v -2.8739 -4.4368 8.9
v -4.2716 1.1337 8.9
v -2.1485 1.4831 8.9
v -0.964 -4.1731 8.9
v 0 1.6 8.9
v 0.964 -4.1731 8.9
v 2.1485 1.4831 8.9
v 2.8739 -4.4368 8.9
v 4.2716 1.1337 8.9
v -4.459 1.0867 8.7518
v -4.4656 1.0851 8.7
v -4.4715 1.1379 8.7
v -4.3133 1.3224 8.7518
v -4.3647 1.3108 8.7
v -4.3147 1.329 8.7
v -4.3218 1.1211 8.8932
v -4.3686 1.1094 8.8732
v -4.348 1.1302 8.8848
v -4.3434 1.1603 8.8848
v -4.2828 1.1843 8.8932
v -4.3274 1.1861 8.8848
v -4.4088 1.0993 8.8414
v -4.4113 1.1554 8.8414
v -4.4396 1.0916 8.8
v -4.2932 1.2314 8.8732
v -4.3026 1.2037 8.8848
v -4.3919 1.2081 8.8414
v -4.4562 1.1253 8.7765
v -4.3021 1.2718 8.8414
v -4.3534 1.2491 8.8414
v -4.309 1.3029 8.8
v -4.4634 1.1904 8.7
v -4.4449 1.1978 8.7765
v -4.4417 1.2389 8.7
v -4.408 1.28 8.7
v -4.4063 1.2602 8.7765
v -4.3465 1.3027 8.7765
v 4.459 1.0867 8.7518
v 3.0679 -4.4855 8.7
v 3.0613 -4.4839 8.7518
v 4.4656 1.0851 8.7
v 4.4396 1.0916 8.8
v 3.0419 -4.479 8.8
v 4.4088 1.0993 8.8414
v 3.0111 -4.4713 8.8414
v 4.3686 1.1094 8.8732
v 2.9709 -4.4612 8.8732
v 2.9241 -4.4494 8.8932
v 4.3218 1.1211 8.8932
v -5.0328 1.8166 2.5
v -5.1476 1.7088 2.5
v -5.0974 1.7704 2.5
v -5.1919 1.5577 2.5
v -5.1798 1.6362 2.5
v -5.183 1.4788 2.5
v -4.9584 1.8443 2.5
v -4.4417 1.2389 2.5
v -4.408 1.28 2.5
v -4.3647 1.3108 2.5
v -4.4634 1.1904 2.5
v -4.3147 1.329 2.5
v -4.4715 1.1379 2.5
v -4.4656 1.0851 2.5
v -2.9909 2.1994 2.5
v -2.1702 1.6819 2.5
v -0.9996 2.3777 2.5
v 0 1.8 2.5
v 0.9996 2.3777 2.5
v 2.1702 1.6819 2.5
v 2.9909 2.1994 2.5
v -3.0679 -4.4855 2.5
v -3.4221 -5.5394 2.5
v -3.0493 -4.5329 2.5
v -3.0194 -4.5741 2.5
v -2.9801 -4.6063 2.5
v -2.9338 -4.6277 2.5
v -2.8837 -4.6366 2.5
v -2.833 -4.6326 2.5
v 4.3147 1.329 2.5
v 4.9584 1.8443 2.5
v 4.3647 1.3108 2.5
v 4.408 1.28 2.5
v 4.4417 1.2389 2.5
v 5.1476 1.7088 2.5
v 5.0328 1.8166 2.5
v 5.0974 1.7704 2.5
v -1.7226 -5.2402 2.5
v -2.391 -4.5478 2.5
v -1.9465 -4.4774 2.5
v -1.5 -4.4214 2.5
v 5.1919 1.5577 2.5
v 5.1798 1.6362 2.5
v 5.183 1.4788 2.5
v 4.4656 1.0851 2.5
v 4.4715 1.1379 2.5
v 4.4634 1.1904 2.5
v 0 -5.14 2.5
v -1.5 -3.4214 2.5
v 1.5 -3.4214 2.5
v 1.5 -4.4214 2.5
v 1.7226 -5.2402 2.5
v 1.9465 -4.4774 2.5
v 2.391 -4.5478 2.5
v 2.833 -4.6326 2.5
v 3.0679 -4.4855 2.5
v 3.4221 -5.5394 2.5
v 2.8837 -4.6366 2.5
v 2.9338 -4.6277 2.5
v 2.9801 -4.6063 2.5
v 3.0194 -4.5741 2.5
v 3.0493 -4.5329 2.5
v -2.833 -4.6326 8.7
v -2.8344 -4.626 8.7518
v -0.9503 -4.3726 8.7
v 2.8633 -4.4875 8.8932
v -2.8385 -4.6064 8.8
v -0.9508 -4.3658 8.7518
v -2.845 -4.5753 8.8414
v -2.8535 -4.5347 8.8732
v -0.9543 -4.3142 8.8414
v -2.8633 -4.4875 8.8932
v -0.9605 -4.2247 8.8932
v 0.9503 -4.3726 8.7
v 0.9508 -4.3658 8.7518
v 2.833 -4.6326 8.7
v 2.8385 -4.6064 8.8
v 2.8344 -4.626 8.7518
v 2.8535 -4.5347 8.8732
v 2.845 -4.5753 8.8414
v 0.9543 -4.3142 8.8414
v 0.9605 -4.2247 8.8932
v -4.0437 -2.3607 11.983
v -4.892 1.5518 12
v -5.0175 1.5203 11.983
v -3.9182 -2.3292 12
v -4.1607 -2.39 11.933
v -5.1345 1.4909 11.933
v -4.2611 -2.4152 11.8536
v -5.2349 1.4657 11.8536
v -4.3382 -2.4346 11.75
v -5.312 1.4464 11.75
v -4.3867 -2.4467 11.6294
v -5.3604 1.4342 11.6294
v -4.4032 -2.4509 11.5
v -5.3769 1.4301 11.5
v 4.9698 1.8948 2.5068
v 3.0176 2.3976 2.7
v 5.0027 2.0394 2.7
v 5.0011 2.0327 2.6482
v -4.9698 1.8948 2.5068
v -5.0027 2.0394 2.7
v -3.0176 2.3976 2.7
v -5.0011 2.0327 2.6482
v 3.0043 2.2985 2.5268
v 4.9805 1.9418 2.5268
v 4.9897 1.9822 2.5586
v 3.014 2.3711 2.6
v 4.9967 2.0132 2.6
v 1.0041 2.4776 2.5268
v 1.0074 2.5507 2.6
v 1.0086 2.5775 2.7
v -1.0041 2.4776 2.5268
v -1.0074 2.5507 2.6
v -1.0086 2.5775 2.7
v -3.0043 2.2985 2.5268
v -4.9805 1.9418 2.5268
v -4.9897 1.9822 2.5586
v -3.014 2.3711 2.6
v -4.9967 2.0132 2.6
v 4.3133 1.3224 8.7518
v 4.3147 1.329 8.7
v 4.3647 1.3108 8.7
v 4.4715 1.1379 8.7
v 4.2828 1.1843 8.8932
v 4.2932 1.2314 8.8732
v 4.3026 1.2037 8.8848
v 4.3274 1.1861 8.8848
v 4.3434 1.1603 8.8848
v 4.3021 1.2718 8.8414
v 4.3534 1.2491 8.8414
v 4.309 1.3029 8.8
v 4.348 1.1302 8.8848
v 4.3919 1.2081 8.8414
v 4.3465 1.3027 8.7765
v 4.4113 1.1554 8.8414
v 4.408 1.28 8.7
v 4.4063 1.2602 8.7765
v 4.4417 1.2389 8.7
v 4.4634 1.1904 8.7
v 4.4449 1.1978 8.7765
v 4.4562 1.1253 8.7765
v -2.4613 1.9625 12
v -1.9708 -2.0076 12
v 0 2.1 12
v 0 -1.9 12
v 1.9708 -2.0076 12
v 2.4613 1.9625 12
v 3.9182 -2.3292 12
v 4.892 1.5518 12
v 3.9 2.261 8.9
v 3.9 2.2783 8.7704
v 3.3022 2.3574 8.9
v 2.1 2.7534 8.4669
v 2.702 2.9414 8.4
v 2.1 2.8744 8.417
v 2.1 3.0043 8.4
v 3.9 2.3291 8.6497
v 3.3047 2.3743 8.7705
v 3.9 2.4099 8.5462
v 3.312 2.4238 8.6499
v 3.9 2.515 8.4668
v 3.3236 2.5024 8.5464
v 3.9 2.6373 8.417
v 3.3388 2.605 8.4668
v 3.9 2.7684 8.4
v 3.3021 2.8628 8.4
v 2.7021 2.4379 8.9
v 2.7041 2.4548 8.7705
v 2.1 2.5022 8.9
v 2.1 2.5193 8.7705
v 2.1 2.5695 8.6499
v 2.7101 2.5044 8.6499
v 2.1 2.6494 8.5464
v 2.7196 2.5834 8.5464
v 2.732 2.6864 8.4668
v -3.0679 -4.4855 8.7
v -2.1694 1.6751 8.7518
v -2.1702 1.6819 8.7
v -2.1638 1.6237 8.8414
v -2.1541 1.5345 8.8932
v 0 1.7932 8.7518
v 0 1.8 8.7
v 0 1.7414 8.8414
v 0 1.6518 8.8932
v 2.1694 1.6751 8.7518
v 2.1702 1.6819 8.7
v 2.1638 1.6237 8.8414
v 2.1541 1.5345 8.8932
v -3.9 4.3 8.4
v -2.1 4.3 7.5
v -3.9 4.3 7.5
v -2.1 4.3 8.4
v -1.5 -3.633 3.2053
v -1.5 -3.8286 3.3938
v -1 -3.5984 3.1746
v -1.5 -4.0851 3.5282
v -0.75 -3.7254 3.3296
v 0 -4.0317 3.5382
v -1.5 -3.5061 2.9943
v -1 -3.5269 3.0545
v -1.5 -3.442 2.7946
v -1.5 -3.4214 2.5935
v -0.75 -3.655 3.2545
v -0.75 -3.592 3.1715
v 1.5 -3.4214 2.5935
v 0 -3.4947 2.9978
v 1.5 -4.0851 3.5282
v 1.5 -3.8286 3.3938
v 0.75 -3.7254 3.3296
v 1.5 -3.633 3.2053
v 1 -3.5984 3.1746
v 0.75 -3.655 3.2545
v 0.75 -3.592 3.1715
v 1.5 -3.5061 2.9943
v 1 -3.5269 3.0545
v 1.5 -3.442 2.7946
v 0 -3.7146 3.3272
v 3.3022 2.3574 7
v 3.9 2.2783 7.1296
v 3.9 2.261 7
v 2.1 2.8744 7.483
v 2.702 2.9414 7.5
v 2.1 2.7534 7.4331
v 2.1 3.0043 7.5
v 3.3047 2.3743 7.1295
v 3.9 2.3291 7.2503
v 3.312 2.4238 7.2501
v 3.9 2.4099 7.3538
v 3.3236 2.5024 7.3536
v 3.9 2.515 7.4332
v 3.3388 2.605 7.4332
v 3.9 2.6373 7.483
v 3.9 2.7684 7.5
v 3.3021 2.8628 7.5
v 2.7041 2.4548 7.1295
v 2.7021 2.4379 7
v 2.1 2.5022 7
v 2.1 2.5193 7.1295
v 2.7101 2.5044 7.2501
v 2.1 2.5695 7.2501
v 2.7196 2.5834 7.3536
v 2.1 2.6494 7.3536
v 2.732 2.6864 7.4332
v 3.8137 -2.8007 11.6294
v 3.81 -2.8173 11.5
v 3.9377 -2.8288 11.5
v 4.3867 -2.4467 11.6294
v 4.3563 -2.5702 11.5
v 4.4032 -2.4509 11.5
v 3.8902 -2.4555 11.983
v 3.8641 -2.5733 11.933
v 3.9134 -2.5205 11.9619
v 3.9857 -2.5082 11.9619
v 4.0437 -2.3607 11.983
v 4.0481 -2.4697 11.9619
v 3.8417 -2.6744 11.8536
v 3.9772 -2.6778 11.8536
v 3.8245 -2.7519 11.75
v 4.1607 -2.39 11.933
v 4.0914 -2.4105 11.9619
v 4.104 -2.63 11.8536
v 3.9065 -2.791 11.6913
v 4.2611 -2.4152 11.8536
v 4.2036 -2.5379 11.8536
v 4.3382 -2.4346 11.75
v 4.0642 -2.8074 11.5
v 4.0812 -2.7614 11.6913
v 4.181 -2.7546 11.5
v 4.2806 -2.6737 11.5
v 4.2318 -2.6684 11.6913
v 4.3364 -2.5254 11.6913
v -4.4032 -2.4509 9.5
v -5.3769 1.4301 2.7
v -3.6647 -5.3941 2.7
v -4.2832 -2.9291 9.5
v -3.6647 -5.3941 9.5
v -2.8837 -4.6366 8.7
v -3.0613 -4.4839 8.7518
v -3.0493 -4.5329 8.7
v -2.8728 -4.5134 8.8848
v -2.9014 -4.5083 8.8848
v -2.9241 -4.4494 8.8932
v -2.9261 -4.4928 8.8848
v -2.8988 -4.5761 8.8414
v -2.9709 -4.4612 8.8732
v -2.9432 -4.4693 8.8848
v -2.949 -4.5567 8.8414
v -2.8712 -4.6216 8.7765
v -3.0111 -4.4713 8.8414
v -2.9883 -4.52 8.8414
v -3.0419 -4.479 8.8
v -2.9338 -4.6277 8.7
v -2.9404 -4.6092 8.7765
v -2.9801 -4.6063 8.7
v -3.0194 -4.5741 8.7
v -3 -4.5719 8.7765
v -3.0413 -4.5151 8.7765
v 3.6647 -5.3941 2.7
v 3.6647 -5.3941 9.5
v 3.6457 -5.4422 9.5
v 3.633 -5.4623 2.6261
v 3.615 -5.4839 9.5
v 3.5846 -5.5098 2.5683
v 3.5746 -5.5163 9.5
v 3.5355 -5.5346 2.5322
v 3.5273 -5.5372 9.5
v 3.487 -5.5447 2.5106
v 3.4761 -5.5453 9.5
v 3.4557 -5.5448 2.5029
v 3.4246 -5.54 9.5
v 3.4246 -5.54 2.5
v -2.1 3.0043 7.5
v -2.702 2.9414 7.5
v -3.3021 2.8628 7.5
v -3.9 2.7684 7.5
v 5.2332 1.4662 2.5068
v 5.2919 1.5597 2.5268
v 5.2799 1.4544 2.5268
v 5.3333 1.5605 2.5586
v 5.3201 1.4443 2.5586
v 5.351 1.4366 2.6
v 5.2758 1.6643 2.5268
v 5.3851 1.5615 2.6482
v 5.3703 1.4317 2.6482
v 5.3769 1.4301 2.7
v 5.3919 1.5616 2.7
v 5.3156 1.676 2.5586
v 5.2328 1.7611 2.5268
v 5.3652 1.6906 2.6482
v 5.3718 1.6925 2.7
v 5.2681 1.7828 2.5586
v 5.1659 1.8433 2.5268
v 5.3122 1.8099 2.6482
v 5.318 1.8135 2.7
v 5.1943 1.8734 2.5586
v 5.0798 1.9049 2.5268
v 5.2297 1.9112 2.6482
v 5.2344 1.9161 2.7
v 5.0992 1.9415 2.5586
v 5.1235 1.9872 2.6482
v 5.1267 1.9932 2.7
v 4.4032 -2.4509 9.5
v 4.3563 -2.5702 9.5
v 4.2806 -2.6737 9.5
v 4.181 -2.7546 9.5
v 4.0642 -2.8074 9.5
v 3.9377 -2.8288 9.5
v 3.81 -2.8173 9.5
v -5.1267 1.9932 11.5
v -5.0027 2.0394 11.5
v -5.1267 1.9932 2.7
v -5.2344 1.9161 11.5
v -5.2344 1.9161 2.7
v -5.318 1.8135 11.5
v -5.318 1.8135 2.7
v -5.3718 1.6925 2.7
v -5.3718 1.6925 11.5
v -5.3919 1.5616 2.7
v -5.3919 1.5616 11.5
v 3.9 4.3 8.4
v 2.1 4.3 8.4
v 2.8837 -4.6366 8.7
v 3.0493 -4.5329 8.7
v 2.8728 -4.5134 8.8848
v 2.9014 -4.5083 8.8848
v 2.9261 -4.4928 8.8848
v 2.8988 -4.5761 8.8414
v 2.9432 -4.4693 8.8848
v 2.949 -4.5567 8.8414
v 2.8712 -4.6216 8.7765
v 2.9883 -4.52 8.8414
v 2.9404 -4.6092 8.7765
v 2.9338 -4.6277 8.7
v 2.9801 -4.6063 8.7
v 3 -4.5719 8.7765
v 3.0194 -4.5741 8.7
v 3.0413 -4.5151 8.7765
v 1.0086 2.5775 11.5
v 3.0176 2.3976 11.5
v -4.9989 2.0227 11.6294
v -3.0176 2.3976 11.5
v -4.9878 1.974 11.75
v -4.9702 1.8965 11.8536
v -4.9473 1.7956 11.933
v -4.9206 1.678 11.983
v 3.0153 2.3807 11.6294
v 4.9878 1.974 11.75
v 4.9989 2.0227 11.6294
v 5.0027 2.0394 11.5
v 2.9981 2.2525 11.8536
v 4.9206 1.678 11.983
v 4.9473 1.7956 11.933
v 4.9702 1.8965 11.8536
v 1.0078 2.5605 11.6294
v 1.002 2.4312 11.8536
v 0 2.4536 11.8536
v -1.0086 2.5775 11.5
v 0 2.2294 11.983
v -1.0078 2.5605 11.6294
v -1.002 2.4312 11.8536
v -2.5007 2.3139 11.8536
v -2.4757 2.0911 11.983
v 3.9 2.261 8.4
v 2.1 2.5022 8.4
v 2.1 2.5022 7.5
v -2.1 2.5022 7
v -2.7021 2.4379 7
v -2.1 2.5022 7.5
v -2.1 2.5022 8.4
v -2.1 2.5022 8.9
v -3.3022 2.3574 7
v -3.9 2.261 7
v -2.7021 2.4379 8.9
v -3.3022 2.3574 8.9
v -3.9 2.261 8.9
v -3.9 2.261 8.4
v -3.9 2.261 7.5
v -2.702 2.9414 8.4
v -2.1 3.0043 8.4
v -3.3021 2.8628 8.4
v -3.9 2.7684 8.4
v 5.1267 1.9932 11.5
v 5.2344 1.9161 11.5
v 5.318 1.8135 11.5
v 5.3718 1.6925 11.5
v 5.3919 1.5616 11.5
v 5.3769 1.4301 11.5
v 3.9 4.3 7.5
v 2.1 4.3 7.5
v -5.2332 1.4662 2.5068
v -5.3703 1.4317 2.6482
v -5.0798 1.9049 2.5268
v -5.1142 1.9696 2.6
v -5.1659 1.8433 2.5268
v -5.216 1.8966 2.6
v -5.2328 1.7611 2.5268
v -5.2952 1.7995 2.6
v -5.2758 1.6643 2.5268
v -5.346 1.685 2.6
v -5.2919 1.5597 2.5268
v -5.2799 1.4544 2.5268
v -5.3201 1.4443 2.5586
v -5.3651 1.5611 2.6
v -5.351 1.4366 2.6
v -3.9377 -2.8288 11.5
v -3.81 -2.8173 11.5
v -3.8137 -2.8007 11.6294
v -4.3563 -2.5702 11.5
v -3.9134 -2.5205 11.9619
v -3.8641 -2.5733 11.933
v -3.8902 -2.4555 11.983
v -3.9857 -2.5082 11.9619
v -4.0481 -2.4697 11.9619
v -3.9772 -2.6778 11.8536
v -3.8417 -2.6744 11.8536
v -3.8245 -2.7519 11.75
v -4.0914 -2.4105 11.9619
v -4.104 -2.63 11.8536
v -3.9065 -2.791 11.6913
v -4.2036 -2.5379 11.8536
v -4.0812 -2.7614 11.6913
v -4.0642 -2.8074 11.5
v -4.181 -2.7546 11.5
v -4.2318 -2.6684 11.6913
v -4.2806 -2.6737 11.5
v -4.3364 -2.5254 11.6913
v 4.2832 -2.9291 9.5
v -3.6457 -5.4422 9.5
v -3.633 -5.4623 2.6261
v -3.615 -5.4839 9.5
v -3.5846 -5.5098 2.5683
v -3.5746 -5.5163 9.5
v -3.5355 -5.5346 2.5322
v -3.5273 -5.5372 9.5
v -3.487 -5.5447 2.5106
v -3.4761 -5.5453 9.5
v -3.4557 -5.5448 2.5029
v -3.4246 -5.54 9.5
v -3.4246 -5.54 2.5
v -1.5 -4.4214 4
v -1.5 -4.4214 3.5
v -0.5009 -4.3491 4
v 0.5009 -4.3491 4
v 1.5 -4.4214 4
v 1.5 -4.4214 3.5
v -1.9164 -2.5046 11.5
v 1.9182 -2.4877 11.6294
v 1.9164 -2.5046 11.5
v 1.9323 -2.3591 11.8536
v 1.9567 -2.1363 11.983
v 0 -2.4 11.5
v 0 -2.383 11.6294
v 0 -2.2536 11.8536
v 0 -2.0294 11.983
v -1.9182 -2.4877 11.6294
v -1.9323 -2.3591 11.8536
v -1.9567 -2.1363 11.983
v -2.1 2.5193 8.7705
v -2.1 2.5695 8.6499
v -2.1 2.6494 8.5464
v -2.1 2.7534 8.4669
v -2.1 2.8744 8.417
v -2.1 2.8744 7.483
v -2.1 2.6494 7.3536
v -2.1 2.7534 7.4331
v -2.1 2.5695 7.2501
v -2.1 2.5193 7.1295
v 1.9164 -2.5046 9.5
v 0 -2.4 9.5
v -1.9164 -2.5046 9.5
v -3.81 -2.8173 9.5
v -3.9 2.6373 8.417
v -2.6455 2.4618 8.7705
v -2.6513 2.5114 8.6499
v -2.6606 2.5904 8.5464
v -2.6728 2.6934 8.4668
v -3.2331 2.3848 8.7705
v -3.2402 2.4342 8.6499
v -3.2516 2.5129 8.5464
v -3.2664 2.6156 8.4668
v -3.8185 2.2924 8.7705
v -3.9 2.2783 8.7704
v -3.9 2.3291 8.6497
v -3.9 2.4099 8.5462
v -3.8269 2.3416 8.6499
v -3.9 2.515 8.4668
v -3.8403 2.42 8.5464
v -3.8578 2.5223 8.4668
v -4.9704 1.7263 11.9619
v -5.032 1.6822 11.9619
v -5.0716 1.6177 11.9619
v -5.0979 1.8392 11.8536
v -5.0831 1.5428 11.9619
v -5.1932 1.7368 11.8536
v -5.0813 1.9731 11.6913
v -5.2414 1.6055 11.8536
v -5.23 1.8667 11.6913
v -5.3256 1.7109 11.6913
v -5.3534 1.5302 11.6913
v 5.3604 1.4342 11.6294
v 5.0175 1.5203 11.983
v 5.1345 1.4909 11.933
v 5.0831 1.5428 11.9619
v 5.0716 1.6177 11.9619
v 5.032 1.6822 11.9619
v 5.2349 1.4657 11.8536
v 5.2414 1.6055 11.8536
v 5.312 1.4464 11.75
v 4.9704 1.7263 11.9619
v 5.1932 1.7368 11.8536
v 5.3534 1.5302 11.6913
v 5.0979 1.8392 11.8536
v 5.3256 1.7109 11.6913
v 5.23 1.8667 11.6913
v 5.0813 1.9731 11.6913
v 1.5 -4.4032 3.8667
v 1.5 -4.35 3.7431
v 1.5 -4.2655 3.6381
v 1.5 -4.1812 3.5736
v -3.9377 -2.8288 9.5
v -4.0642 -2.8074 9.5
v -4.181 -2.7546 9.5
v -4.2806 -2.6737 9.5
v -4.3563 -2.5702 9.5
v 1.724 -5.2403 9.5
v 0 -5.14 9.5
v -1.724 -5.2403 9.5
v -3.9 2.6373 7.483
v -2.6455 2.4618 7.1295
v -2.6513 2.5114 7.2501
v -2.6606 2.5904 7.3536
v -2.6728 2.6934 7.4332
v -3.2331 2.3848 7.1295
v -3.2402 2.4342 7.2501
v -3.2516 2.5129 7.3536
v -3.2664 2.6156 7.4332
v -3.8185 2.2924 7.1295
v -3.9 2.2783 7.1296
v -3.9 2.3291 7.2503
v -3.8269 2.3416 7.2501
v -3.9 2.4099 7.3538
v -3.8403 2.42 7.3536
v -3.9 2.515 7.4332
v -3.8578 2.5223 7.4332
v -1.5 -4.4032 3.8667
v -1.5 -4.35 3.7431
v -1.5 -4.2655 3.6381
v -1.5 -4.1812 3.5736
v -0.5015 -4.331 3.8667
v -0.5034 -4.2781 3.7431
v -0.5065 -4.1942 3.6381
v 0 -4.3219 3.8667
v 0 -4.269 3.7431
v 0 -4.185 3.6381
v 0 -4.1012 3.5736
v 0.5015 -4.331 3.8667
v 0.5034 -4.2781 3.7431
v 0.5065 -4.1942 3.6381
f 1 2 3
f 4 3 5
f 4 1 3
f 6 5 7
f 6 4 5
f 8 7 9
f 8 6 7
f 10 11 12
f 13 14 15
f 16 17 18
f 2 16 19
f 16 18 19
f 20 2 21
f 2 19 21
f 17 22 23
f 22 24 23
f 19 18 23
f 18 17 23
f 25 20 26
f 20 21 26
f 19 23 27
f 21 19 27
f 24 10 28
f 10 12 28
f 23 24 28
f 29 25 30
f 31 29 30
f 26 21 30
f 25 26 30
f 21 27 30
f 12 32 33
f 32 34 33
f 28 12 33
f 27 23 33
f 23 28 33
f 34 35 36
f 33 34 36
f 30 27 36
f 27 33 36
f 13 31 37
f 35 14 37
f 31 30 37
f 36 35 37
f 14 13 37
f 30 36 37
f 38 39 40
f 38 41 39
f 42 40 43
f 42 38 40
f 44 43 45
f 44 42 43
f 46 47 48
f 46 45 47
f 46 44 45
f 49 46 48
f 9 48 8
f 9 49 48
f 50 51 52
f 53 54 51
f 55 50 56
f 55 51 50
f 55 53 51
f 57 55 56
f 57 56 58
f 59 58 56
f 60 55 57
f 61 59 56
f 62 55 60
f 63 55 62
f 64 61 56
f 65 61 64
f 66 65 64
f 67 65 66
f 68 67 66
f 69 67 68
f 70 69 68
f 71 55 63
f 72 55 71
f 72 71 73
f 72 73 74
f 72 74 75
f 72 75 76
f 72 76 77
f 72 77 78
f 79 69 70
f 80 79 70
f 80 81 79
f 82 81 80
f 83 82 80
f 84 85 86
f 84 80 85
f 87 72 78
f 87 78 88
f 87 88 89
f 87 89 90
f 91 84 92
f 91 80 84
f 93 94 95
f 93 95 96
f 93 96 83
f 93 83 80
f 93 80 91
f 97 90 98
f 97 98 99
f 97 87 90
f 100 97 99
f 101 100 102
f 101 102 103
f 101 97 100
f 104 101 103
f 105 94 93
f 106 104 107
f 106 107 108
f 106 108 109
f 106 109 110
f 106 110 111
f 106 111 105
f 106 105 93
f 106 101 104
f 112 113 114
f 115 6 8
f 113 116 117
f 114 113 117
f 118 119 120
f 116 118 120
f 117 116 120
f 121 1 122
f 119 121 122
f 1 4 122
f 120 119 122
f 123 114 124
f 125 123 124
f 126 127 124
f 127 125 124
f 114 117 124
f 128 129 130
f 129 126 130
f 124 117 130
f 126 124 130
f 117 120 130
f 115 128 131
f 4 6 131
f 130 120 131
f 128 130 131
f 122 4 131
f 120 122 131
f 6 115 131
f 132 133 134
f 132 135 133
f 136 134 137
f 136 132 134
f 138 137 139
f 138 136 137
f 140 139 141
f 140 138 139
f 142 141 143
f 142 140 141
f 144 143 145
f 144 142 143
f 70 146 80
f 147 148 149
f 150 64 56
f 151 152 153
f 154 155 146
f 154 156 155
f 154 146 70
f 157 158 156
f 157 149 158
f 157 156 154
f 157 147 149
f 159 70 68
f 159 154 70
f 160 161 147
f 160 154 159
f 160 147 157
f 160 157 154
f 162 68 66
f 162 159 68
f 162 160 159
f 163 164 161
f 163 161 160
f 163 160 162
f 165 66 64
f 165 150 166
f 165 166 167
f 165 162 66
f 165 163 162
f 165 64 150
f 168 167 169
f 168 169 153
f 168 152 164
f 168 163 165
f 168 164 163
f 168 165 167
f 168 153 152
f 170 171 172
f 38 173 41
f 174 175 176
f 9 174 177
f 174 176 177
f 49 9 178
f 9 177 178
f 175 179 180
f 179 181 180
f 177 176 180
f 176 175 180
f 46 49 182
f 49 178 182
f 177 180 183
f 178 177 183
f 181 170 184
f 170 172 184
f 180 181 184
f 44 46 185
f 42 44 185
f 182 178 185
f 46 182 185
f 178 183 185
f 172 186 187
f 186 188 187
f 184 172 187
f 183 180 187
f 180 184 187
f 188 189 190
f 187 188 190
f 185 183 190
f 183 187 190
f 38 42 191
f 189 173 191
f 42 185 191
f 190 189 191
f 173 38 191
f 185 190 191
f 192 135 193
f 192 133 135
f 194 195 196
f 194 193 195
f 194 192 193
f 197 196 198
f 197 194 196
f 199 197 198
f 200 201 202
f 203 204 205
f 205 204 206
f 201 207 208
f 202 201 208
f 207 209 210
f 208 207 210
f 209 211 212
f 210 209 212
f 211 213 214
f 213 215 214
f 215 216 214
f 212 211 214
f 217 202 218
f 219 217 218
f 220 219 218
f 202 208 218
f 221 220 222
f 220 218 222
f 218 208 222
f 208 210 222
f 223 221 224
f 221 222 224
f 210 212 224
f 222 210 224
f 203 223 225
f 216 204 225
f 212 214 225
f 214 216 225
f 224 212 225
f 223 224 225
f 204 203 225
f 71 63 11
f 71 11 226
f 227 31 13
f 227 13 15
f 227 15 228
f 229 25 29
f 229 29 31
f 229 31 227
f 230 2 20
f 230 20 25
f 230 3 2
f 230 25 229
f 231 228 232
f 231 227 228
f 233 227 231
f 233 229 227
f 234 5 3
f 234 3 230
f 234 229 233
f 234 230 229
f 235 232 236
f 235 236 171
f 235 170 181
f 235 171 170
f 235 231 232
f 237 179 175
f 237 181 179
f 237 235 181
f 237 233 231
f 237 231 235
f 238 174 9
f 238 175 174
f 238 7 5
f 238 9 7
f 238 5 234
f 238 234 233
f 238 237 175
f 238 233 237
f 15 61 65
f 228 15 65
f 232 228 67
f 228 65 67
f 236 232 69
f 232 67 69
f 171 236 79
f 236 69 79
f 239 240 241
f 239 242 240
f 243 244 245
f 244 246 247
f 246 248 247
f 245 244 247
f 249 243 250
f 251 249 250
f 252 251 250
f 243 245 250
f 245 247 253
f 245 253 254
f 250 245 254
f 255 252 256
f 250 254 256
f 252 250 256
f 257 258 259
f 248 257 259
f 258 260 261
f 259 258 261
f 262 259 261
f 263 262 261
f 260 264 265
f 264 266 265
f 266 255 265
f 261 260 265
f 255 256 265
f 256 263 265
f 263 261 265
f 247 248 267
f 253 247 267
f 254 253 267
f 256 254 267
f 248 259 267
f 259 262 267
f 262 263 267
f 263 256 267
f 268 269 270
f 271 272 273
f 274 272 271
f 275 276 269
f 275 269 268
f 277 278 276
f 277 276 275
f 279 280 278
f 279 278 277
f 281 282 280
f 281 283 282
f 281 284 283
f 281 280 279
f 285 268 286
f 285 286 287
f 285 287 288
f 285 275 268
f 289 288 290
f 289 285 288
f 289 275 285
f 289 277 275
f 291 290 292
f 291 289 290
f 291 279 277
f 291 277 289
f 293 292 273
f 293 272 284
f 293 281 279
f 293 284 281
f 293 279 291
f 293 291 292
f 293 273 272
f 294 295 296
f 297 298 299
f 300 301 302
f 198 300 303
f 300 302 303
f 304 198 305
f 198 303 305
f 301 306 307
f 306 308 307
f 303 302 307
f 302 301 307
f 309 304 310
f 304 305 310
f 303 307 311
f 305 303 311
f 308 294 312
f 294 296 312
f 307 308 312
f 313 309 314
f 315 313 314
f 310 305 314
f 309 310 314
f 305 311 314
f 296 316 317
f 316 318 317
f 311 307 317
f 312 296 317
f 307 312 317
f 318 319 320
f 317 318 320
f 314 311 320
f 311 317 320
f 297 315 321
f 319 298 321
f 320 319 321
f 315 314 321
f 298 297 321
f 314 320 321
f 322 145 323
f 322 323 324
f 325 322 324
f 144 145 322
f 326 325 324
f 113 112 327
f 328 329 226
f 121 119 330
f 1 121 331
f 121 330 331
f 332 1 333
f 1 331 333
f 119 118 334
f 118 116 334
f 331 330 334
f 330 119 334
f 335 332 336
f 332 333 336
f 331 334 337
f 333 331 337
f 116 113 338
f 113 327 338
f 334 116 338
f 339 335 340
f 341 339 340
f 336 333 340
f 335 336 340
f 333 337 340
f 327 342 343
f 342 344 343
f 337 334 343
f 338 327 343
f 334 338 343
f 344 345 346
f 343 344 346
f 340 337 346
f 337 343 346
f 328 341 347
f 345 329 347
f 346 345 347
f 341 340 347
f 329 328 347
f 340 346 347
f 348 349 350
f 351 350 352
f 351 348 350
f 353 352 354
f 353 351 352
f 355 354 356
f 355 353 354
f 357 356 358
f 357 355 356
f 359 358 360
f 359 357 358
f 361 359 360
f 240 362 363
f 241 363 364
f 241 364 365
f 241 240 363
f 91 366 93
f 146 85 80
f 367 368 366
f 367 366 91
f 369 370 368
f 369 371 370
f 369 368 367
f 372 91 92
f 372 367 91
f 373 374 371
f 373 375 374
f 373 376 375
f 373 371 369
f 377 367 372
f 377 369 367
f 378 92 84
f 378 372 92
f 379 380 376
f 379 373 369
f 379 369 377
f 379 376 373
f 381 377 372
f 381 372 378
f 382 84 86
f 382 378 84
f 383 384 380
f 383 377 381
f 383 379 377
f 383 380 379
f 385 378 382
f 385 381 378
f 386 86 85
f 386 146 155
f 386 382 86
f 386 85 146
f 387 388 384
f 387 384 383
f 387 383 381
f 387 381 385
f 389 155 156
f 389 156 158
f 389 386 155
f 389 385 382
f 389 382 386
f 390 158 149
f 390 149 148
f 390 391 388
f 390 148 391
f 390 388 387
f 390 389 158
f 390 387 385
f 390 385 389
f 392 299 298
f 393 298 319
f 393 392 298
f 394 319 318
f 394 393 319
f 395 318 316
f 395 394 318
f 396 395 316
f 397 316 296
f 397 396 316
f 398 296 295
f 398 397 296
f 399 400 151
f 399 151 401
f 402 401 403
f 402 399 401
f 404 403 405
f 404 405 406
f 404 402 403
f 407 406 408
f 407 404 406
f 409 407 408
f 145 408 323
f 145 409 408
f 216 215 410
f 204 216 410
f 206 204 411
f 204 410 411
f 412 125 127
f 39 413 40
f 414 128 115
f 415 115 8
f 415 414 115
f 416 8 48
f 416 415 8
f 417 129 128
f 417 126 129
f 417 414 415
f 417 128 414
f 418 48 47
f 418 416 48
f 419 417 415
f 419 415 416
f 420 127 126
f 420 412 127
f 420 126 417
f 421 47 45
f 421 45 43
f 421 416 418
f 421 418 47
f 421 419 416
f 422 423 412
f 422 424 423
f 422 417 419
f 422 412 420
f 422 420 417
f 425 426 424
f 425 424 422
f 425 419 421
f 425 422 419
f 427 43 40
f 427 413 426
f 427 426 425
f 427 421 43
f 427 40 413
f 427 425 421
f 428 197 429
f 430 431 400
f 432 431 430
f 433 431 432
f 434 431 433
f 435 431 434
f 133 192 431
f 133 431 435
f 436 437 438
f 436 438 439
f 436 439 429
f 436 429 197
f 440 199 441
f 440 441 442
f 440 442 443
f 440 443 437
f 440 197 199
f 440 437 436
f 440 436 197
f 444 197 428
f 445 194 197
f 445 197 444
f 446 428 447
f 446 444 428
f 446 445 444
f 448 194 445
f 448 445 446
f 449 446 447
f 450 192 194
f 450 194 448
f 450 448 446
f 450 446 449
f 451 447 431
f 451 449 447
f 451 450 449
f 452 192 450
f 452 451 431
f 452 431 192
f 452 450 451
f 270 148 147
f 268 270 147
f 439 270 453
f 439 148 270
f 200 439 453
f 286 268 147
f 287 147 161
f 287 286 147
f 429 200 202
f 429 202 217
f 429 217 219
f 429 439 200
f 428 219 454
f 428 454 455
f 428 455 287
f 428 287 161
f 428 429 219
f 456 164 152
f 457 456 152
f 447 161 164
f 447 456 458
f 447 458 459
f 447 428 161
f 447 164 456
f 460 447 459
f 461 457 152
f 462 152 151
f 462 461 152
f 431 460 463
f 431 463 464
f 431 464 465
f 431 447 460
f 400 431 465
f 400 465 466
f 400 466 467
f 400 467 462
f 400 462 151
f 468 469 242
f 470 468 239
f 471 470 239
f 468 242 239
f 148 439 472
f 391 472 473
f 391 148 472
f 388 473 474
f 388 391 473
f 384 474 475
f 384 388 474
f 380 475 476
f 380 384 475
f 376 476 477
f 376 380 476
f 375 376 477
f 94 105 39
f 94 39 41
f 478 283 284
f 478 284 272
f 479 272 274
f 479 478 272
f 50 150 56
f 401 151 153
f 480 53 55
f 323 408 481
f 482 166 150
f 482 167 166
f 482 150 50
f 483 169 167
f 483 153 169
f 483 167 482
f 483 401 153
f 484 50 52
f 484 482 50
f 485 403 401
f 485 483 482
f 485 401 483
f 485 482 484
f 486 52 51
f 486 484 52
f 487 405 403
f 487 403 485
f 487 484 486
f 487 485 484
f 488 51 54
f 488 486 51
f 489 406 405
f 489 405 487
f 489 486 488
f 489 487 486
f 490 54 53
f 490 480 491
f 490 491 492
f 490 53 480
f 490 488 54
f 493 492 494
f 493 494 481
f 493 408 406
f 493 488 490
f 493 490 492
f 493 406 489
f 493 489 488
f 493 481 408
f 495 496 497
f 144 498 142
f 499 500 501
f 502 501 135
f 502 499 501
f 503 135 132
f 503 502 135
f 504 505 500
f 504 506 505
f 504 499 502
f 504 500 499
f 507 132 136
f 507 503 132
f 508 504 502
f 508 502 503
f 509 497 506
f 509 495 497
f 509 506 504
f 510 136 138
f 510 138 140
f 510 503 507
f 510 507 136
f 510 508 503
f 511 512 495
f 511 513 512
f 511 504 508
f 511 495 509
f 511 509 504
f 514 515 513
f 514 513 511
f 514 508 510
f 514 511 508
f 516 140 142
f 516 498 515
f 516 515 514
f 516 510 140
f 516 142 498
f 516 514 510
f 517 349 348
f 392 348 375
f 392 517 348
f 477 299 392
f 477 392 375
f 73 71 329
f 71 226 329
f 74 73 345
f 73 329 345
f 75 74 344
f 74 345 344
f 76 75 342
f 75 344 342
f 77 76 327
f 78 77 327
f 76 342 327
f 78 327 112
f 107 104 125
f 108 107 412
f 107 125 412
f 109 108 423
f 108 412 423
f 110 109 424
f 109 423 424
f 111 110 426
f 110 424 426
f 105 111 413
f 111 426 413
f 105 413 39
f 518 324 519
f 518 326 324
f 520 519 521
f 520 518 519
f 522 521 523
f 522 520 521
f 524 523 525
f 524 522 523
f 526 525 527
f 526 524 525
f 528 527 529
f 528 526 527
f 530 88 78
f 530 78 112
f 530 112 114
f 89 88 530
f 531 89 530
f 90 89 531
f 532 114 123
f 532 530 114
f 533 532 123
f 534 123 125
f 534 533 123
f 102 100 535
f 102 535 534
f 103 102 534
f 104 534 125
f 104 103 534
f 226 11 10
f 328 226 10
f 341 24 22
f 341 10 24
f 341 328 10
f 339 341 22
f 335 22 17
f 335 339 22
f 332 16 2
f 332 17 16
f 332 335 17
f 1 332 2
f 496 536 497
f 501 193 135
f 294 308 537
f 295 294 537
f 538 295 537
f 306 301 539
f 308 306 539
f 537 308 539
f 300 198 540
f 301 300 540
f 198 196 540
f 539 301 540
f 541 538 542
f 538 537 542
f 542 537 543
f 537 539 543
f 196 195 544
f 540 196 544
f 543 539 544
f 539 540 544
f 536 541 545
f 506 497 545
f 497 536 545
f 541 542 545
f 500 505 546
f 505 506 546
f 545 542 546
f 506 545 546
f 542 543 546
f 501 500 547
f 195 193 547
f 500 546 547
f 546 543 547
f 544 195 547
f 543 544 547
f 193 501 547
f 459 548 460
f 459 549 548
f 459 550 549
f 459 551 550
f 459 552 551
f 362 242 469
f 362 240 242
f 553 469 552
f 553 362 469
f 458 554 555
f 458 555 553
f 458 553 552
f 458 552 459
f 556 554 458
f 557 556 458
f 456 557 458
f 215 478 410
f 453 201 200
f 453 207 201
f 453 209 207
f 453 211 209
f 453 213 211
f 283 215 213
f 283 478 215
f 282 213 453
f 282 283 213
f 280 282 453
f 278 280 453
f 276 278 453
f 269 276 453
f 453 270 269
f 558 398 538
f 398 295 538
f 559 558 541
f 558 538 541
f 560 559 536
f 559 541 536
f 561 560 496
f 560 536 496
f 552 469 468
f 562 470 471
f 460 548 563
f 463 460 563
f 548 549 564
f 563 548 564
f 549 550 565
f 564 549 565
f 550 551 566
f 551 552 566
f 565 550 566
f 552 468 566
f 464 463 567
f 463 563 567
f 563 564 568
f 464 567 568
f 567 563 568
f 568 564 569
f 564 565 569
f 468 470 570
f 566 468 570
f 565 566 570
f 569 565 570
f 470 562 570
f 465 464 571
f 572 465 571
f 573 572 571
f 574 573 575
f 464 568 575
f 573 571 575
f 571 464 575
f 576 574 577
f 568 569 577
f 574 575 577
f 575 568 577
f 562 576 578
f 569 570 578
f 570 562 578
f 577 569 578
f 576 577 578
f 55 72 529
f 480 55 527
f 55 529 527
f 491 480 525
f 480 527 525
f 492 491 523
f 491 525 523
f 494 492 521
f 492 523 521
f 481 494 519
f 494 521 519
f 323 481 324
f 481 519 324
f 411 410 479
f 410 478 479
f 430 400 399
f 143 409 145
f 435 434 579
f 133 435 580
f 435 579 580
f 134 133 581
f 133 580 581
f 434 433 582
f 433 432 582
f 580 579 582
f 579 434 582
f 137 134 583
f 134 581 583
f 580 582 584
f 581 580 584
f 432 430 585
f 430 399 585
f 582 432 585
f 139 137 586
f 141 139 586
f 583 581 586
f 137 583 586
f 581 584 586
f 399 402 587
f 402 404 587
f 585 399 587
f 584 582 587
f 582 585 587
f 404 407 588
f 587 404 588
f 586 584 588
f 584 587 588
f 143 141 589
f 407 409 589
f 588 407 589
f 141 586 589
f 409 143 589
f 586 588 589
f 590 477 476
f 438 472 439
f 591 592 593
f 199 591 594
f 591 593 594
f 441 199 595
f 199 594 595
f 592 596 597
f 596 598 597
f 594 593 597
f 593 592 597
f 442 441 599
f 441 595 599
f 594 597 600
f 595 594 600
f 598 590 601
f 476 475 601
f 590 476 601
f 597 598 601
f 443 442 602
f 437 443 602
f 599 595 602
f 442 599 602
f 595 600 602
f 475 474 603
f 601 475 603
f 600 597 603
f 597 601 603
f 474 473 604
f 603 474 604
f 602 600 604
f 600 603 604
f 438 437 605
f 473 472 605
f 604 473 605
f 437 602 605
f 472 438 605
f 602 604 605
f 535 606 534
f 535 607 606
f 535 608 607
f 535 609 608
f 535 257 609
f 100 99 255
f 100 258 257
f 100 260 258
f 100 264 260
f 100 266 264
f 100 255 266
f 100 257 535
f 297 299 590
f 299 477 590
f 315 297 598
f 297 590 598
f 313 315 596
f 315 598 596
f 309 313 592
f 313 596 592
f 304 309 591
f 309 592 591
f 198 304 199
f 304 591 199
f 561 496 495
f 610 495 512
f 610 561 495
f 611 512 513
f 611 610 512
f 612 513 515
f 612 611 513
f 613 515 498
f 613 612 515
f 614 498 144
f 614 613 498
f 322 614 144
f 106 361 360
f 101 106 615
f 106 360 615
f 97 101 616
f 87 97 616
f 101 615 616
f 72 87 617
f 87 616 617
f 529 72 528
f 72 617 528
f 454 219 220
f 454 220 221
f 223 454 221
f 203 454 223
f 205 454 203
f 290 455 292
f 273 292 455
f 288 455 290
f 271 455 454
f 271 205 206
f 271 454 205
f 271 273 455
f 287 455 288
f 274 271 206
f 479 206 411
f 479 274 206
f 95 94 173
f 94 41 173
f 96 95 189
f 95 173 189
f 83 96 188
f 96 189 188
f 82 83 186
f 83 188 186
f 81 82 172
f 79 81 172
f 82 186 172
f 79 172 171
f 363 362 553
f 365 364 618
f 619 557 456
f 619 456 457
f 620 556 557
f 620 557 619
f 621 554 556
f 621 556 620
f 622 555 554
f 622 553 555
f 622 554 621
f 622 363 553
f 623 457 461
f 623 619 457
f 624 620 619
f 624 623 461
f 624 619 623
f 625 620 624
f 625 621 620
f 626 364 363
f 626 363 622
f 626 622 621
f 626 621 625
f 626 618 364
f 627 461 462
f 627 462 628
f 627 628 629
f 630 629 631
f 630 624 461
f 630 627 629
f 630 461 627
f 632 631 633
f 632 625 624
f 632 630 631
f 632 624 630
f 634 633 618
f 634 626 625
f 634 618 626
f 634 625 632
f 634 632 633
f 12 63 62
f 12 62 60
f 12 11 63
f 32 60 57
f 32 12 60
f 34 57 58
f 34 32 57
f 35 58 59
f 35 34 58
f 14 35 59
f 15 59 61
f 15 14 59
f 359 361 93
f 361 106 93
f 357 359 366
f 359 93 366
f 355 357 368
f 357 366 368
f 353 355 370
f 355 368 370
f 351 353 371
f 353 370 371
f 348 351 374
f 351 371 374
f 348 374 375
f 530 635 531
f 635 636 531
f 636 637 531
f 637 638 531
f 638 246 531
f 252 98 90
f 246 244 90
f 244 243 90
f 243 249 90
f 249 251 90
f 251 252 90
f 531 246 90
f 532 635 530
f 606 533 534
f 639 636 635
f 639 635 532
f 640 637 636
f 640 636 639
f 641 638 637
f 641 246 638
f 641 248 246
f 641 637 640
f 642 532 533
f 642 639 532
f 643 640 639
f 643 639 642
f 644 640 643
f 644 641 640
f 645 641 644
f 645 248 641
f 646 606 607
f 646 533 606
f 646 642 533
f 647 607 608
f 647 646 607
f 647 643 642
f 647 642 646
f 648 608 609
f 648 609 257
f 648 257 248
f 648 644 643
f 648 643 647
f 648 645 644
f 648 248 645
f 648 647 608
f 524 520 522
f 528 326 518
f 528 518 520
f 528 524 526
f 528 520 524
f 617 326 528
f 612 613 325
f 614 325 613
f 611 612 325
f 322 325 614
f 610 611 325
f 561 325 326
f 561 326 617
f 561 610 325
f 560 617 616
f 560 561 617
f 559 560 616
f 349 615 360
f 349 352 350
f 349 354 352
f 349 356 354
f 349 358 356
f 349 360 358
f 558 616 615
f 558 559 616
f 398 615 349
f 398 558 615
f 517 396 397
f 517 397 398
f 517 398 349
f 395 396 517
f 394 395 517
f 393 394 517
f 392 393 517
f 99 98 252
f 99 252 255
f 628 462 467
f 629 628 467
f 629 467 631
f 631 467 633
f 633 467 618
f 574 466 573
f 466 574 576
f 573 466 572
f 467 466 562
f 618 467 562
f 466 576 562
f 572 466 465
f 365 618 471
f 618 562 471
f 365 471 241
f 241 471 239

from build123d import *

# Parameters (mm, degrees)
PAD011_DEPTH      = 2
PAD011_DEPTH_BACK = 7.5
POCKET004_DEPTH   = 6.4
POCKET005_DEPTH   = 2.5
PAD013_DEPTH      = 0.45
PAD013_DEPTH_BACK = 0.45
FILLET023_R       = 0.5
FILLET025_R       = 0.2
FILLET024_R       = 0.2
FILLET020_R       = 0.5
SKETCH021_W       = 3
SKETCH021_H       = 1
PAD012_DEPTH      = 1
FILLET022_R       = 0.5
FILLET021_R       = 0.99


with BuildPart() as part:
    # Sketch019 (on DatumPlane) → Pad011 (new body, two sides)
    with BuildSketch(Plane.XY.offset(10)) as pad011_sk:
        with BuildLine():
            ThreePointArc((5.5, 1.920538), (0, 2.6), (-5.5, 1.920538))
            Line((-5.5, 1.920538), (-3.616372, -5.586761))
            ThreePointArc((3.616372, -5.586761), (0, -5.14), (-3.616372, -5.586761))
            Line((3.616372, -5.586761), (5.5, 1.920538))
        make_face()
    extrude(amount=PAD011_DEPTH)
    extrude(pad011_sk.sketch, amount=-PAD011_DEPTH_BACK)

    # Sketch017 (on Face5 of Pad011) → Pocket004 (cut)
    with BuildSketch(Plane(origin=(0, 0, 2.5), x_dir=(1, 0, 0), z_dir=(0, 0, -1))):
        with BuildLine():
            ThreePointArc((-4.515394, -1.283614), (0, -1.8), (4.515394, -1.283614))
            Line((3.020793, 4.673197), (4.515394, -1.283614))
            ThreePointArc((-3.020793, 4.673197), (0, 4.34), (3.020793, 4.673197))
            Line((-4.515394, -1.283614), (-3.020793, 4.673197))
        make_face()
    extrude(amount=-POCKET004_DEPTH, mode=Mode.SUBTRACT)

    # Sketch018 (on Face5 of Pocket004) → Pocket005 (cut)
    with BuildSketch(Plane.XY.offset(12)):
        with BuildLine():
            ThreePointArc((4.283186, -2.929138), (0, -2.4), (-4.283186, -2.929138))
            Line((-4.283186, -2.929138), (-3.616372, -5.586761))
            ThreePointArc((3.616372, -5.586761), (0, -5.14), (-3.616372, -5.586761))
            Line((4.283186, -2.929138), (3.616372, -5.586761))
        make_face()
    extrude(amount=-POCKET005_DEPTH, mode=Mode.SUBTRACT)

    # Sketch020 (on DatumPlane) → Pad013 (join, two sides)
    with BuildSketch(Plane.XY.offset(7.95)) as pad013_sk:
        Polygon((-3.9, 2.260952), (-3.9, 4.3), (-3, 4.3), (-2.1, 4.3), (-2.1, 2.502222), align=None)
        Polygon((2.1, 2.502222), (2.1, 4.3), (3, 4.3), (3.9, 4.3), (3.9, 2.260952), align=None)
    extrude(amount=PAD013_DEPTH)
    extrude(pad013_sk.sketch, amount=-PAD013_DEPTH_BACK)

    # Fillet023
    fillet023_edges = [part.edges().sort_by_distance(p)[0] for p in [
        (0, -2.4, 12),
        (4.891593, -0.5043, 12),
        (0, 2.6, 12),
        (-4.891593, -0.5043, 12),
        (4.283186, -2.929138, 10.75),
        (5.5, 1.920538, 7.25),
        (-5.5, 1.920538, 7.25),
        (-4.283186, -2.929138, 10.75),
    ]]
    fillet(fillet023_edges, radius=FILLET023_R)

    # Fillet025
    fillet025_edges = [part.edges().sort_by_distance(p)[0] for p in [
        (-3.616372, -5.586761, 6),
        (3.616372, -5.586761, 6),
        (-4.496657, -2.078339, 2.5),
        (4.496657, -2.078339, 2.5),
    ]]
    fillet(fillet025_edges, radius=FILLET025_R)

    # Fillet024
    fillet024_edges = [part.edges().sort_by_distance(p)[0] for p in [
        (0, -4.34, 8.9),
        (-3.768094, -1.694791, 8.9),
        (0, 1.8, 8.9),
        (3.768094, -1.694791, 8.9),
        (4.515394, 1.283614, 5.7),
        (3.020793, -4.673197, 5.7),
        (-3.020793, -4.673197, 5.7),
        (-4.515394, 1.283614, 5.7),
    ]]
    fillet(fillet024_edges, radius=FILLET024_R)

    # Fillet020
    fillet020_edges = [part.edges().sort_by_distance(p)[0] for p in [
        (-3.002424, 2.399675, 8.4),
        (-3.002424, 2.399675, 7.5),
        (3.002424, 2.399675, 7.5),
        (3.002424, 2.399675, 8.4),
    ]]
    fillet(fillet020_edges, radius=FILLET020_R)

    # Sketch021 (on Face21 of Fillet020) → Pad012 (join)
    with BuildSketch(Plane(origin=(0, 0, 2.5), x_dir=(1, 0, 0), z_dir=(0, 0, -1))):
        with Locations((0, 3.921408)):
            Rectangle(SKETCH021_W, SKETCH021_H)
    extrude(amount=-PAD012_DEPTH)

    # Fillet022
    fillet022_edges = [part.edges().sort_by_distance(p)[0] for p in [
        (0, -4.34, 3.5),
    ]]
    fillet(fillet022_edges, radius=FILLET022_R)

    # Fillet021
    fillet021_edges = [part.edges().sort_by_distance(p)[0] for p in [
        (0, -3.421408, 3.5),
    ]]
    fillet(fillet021_edges, radius=FILLET021_R)


solid = part.part
